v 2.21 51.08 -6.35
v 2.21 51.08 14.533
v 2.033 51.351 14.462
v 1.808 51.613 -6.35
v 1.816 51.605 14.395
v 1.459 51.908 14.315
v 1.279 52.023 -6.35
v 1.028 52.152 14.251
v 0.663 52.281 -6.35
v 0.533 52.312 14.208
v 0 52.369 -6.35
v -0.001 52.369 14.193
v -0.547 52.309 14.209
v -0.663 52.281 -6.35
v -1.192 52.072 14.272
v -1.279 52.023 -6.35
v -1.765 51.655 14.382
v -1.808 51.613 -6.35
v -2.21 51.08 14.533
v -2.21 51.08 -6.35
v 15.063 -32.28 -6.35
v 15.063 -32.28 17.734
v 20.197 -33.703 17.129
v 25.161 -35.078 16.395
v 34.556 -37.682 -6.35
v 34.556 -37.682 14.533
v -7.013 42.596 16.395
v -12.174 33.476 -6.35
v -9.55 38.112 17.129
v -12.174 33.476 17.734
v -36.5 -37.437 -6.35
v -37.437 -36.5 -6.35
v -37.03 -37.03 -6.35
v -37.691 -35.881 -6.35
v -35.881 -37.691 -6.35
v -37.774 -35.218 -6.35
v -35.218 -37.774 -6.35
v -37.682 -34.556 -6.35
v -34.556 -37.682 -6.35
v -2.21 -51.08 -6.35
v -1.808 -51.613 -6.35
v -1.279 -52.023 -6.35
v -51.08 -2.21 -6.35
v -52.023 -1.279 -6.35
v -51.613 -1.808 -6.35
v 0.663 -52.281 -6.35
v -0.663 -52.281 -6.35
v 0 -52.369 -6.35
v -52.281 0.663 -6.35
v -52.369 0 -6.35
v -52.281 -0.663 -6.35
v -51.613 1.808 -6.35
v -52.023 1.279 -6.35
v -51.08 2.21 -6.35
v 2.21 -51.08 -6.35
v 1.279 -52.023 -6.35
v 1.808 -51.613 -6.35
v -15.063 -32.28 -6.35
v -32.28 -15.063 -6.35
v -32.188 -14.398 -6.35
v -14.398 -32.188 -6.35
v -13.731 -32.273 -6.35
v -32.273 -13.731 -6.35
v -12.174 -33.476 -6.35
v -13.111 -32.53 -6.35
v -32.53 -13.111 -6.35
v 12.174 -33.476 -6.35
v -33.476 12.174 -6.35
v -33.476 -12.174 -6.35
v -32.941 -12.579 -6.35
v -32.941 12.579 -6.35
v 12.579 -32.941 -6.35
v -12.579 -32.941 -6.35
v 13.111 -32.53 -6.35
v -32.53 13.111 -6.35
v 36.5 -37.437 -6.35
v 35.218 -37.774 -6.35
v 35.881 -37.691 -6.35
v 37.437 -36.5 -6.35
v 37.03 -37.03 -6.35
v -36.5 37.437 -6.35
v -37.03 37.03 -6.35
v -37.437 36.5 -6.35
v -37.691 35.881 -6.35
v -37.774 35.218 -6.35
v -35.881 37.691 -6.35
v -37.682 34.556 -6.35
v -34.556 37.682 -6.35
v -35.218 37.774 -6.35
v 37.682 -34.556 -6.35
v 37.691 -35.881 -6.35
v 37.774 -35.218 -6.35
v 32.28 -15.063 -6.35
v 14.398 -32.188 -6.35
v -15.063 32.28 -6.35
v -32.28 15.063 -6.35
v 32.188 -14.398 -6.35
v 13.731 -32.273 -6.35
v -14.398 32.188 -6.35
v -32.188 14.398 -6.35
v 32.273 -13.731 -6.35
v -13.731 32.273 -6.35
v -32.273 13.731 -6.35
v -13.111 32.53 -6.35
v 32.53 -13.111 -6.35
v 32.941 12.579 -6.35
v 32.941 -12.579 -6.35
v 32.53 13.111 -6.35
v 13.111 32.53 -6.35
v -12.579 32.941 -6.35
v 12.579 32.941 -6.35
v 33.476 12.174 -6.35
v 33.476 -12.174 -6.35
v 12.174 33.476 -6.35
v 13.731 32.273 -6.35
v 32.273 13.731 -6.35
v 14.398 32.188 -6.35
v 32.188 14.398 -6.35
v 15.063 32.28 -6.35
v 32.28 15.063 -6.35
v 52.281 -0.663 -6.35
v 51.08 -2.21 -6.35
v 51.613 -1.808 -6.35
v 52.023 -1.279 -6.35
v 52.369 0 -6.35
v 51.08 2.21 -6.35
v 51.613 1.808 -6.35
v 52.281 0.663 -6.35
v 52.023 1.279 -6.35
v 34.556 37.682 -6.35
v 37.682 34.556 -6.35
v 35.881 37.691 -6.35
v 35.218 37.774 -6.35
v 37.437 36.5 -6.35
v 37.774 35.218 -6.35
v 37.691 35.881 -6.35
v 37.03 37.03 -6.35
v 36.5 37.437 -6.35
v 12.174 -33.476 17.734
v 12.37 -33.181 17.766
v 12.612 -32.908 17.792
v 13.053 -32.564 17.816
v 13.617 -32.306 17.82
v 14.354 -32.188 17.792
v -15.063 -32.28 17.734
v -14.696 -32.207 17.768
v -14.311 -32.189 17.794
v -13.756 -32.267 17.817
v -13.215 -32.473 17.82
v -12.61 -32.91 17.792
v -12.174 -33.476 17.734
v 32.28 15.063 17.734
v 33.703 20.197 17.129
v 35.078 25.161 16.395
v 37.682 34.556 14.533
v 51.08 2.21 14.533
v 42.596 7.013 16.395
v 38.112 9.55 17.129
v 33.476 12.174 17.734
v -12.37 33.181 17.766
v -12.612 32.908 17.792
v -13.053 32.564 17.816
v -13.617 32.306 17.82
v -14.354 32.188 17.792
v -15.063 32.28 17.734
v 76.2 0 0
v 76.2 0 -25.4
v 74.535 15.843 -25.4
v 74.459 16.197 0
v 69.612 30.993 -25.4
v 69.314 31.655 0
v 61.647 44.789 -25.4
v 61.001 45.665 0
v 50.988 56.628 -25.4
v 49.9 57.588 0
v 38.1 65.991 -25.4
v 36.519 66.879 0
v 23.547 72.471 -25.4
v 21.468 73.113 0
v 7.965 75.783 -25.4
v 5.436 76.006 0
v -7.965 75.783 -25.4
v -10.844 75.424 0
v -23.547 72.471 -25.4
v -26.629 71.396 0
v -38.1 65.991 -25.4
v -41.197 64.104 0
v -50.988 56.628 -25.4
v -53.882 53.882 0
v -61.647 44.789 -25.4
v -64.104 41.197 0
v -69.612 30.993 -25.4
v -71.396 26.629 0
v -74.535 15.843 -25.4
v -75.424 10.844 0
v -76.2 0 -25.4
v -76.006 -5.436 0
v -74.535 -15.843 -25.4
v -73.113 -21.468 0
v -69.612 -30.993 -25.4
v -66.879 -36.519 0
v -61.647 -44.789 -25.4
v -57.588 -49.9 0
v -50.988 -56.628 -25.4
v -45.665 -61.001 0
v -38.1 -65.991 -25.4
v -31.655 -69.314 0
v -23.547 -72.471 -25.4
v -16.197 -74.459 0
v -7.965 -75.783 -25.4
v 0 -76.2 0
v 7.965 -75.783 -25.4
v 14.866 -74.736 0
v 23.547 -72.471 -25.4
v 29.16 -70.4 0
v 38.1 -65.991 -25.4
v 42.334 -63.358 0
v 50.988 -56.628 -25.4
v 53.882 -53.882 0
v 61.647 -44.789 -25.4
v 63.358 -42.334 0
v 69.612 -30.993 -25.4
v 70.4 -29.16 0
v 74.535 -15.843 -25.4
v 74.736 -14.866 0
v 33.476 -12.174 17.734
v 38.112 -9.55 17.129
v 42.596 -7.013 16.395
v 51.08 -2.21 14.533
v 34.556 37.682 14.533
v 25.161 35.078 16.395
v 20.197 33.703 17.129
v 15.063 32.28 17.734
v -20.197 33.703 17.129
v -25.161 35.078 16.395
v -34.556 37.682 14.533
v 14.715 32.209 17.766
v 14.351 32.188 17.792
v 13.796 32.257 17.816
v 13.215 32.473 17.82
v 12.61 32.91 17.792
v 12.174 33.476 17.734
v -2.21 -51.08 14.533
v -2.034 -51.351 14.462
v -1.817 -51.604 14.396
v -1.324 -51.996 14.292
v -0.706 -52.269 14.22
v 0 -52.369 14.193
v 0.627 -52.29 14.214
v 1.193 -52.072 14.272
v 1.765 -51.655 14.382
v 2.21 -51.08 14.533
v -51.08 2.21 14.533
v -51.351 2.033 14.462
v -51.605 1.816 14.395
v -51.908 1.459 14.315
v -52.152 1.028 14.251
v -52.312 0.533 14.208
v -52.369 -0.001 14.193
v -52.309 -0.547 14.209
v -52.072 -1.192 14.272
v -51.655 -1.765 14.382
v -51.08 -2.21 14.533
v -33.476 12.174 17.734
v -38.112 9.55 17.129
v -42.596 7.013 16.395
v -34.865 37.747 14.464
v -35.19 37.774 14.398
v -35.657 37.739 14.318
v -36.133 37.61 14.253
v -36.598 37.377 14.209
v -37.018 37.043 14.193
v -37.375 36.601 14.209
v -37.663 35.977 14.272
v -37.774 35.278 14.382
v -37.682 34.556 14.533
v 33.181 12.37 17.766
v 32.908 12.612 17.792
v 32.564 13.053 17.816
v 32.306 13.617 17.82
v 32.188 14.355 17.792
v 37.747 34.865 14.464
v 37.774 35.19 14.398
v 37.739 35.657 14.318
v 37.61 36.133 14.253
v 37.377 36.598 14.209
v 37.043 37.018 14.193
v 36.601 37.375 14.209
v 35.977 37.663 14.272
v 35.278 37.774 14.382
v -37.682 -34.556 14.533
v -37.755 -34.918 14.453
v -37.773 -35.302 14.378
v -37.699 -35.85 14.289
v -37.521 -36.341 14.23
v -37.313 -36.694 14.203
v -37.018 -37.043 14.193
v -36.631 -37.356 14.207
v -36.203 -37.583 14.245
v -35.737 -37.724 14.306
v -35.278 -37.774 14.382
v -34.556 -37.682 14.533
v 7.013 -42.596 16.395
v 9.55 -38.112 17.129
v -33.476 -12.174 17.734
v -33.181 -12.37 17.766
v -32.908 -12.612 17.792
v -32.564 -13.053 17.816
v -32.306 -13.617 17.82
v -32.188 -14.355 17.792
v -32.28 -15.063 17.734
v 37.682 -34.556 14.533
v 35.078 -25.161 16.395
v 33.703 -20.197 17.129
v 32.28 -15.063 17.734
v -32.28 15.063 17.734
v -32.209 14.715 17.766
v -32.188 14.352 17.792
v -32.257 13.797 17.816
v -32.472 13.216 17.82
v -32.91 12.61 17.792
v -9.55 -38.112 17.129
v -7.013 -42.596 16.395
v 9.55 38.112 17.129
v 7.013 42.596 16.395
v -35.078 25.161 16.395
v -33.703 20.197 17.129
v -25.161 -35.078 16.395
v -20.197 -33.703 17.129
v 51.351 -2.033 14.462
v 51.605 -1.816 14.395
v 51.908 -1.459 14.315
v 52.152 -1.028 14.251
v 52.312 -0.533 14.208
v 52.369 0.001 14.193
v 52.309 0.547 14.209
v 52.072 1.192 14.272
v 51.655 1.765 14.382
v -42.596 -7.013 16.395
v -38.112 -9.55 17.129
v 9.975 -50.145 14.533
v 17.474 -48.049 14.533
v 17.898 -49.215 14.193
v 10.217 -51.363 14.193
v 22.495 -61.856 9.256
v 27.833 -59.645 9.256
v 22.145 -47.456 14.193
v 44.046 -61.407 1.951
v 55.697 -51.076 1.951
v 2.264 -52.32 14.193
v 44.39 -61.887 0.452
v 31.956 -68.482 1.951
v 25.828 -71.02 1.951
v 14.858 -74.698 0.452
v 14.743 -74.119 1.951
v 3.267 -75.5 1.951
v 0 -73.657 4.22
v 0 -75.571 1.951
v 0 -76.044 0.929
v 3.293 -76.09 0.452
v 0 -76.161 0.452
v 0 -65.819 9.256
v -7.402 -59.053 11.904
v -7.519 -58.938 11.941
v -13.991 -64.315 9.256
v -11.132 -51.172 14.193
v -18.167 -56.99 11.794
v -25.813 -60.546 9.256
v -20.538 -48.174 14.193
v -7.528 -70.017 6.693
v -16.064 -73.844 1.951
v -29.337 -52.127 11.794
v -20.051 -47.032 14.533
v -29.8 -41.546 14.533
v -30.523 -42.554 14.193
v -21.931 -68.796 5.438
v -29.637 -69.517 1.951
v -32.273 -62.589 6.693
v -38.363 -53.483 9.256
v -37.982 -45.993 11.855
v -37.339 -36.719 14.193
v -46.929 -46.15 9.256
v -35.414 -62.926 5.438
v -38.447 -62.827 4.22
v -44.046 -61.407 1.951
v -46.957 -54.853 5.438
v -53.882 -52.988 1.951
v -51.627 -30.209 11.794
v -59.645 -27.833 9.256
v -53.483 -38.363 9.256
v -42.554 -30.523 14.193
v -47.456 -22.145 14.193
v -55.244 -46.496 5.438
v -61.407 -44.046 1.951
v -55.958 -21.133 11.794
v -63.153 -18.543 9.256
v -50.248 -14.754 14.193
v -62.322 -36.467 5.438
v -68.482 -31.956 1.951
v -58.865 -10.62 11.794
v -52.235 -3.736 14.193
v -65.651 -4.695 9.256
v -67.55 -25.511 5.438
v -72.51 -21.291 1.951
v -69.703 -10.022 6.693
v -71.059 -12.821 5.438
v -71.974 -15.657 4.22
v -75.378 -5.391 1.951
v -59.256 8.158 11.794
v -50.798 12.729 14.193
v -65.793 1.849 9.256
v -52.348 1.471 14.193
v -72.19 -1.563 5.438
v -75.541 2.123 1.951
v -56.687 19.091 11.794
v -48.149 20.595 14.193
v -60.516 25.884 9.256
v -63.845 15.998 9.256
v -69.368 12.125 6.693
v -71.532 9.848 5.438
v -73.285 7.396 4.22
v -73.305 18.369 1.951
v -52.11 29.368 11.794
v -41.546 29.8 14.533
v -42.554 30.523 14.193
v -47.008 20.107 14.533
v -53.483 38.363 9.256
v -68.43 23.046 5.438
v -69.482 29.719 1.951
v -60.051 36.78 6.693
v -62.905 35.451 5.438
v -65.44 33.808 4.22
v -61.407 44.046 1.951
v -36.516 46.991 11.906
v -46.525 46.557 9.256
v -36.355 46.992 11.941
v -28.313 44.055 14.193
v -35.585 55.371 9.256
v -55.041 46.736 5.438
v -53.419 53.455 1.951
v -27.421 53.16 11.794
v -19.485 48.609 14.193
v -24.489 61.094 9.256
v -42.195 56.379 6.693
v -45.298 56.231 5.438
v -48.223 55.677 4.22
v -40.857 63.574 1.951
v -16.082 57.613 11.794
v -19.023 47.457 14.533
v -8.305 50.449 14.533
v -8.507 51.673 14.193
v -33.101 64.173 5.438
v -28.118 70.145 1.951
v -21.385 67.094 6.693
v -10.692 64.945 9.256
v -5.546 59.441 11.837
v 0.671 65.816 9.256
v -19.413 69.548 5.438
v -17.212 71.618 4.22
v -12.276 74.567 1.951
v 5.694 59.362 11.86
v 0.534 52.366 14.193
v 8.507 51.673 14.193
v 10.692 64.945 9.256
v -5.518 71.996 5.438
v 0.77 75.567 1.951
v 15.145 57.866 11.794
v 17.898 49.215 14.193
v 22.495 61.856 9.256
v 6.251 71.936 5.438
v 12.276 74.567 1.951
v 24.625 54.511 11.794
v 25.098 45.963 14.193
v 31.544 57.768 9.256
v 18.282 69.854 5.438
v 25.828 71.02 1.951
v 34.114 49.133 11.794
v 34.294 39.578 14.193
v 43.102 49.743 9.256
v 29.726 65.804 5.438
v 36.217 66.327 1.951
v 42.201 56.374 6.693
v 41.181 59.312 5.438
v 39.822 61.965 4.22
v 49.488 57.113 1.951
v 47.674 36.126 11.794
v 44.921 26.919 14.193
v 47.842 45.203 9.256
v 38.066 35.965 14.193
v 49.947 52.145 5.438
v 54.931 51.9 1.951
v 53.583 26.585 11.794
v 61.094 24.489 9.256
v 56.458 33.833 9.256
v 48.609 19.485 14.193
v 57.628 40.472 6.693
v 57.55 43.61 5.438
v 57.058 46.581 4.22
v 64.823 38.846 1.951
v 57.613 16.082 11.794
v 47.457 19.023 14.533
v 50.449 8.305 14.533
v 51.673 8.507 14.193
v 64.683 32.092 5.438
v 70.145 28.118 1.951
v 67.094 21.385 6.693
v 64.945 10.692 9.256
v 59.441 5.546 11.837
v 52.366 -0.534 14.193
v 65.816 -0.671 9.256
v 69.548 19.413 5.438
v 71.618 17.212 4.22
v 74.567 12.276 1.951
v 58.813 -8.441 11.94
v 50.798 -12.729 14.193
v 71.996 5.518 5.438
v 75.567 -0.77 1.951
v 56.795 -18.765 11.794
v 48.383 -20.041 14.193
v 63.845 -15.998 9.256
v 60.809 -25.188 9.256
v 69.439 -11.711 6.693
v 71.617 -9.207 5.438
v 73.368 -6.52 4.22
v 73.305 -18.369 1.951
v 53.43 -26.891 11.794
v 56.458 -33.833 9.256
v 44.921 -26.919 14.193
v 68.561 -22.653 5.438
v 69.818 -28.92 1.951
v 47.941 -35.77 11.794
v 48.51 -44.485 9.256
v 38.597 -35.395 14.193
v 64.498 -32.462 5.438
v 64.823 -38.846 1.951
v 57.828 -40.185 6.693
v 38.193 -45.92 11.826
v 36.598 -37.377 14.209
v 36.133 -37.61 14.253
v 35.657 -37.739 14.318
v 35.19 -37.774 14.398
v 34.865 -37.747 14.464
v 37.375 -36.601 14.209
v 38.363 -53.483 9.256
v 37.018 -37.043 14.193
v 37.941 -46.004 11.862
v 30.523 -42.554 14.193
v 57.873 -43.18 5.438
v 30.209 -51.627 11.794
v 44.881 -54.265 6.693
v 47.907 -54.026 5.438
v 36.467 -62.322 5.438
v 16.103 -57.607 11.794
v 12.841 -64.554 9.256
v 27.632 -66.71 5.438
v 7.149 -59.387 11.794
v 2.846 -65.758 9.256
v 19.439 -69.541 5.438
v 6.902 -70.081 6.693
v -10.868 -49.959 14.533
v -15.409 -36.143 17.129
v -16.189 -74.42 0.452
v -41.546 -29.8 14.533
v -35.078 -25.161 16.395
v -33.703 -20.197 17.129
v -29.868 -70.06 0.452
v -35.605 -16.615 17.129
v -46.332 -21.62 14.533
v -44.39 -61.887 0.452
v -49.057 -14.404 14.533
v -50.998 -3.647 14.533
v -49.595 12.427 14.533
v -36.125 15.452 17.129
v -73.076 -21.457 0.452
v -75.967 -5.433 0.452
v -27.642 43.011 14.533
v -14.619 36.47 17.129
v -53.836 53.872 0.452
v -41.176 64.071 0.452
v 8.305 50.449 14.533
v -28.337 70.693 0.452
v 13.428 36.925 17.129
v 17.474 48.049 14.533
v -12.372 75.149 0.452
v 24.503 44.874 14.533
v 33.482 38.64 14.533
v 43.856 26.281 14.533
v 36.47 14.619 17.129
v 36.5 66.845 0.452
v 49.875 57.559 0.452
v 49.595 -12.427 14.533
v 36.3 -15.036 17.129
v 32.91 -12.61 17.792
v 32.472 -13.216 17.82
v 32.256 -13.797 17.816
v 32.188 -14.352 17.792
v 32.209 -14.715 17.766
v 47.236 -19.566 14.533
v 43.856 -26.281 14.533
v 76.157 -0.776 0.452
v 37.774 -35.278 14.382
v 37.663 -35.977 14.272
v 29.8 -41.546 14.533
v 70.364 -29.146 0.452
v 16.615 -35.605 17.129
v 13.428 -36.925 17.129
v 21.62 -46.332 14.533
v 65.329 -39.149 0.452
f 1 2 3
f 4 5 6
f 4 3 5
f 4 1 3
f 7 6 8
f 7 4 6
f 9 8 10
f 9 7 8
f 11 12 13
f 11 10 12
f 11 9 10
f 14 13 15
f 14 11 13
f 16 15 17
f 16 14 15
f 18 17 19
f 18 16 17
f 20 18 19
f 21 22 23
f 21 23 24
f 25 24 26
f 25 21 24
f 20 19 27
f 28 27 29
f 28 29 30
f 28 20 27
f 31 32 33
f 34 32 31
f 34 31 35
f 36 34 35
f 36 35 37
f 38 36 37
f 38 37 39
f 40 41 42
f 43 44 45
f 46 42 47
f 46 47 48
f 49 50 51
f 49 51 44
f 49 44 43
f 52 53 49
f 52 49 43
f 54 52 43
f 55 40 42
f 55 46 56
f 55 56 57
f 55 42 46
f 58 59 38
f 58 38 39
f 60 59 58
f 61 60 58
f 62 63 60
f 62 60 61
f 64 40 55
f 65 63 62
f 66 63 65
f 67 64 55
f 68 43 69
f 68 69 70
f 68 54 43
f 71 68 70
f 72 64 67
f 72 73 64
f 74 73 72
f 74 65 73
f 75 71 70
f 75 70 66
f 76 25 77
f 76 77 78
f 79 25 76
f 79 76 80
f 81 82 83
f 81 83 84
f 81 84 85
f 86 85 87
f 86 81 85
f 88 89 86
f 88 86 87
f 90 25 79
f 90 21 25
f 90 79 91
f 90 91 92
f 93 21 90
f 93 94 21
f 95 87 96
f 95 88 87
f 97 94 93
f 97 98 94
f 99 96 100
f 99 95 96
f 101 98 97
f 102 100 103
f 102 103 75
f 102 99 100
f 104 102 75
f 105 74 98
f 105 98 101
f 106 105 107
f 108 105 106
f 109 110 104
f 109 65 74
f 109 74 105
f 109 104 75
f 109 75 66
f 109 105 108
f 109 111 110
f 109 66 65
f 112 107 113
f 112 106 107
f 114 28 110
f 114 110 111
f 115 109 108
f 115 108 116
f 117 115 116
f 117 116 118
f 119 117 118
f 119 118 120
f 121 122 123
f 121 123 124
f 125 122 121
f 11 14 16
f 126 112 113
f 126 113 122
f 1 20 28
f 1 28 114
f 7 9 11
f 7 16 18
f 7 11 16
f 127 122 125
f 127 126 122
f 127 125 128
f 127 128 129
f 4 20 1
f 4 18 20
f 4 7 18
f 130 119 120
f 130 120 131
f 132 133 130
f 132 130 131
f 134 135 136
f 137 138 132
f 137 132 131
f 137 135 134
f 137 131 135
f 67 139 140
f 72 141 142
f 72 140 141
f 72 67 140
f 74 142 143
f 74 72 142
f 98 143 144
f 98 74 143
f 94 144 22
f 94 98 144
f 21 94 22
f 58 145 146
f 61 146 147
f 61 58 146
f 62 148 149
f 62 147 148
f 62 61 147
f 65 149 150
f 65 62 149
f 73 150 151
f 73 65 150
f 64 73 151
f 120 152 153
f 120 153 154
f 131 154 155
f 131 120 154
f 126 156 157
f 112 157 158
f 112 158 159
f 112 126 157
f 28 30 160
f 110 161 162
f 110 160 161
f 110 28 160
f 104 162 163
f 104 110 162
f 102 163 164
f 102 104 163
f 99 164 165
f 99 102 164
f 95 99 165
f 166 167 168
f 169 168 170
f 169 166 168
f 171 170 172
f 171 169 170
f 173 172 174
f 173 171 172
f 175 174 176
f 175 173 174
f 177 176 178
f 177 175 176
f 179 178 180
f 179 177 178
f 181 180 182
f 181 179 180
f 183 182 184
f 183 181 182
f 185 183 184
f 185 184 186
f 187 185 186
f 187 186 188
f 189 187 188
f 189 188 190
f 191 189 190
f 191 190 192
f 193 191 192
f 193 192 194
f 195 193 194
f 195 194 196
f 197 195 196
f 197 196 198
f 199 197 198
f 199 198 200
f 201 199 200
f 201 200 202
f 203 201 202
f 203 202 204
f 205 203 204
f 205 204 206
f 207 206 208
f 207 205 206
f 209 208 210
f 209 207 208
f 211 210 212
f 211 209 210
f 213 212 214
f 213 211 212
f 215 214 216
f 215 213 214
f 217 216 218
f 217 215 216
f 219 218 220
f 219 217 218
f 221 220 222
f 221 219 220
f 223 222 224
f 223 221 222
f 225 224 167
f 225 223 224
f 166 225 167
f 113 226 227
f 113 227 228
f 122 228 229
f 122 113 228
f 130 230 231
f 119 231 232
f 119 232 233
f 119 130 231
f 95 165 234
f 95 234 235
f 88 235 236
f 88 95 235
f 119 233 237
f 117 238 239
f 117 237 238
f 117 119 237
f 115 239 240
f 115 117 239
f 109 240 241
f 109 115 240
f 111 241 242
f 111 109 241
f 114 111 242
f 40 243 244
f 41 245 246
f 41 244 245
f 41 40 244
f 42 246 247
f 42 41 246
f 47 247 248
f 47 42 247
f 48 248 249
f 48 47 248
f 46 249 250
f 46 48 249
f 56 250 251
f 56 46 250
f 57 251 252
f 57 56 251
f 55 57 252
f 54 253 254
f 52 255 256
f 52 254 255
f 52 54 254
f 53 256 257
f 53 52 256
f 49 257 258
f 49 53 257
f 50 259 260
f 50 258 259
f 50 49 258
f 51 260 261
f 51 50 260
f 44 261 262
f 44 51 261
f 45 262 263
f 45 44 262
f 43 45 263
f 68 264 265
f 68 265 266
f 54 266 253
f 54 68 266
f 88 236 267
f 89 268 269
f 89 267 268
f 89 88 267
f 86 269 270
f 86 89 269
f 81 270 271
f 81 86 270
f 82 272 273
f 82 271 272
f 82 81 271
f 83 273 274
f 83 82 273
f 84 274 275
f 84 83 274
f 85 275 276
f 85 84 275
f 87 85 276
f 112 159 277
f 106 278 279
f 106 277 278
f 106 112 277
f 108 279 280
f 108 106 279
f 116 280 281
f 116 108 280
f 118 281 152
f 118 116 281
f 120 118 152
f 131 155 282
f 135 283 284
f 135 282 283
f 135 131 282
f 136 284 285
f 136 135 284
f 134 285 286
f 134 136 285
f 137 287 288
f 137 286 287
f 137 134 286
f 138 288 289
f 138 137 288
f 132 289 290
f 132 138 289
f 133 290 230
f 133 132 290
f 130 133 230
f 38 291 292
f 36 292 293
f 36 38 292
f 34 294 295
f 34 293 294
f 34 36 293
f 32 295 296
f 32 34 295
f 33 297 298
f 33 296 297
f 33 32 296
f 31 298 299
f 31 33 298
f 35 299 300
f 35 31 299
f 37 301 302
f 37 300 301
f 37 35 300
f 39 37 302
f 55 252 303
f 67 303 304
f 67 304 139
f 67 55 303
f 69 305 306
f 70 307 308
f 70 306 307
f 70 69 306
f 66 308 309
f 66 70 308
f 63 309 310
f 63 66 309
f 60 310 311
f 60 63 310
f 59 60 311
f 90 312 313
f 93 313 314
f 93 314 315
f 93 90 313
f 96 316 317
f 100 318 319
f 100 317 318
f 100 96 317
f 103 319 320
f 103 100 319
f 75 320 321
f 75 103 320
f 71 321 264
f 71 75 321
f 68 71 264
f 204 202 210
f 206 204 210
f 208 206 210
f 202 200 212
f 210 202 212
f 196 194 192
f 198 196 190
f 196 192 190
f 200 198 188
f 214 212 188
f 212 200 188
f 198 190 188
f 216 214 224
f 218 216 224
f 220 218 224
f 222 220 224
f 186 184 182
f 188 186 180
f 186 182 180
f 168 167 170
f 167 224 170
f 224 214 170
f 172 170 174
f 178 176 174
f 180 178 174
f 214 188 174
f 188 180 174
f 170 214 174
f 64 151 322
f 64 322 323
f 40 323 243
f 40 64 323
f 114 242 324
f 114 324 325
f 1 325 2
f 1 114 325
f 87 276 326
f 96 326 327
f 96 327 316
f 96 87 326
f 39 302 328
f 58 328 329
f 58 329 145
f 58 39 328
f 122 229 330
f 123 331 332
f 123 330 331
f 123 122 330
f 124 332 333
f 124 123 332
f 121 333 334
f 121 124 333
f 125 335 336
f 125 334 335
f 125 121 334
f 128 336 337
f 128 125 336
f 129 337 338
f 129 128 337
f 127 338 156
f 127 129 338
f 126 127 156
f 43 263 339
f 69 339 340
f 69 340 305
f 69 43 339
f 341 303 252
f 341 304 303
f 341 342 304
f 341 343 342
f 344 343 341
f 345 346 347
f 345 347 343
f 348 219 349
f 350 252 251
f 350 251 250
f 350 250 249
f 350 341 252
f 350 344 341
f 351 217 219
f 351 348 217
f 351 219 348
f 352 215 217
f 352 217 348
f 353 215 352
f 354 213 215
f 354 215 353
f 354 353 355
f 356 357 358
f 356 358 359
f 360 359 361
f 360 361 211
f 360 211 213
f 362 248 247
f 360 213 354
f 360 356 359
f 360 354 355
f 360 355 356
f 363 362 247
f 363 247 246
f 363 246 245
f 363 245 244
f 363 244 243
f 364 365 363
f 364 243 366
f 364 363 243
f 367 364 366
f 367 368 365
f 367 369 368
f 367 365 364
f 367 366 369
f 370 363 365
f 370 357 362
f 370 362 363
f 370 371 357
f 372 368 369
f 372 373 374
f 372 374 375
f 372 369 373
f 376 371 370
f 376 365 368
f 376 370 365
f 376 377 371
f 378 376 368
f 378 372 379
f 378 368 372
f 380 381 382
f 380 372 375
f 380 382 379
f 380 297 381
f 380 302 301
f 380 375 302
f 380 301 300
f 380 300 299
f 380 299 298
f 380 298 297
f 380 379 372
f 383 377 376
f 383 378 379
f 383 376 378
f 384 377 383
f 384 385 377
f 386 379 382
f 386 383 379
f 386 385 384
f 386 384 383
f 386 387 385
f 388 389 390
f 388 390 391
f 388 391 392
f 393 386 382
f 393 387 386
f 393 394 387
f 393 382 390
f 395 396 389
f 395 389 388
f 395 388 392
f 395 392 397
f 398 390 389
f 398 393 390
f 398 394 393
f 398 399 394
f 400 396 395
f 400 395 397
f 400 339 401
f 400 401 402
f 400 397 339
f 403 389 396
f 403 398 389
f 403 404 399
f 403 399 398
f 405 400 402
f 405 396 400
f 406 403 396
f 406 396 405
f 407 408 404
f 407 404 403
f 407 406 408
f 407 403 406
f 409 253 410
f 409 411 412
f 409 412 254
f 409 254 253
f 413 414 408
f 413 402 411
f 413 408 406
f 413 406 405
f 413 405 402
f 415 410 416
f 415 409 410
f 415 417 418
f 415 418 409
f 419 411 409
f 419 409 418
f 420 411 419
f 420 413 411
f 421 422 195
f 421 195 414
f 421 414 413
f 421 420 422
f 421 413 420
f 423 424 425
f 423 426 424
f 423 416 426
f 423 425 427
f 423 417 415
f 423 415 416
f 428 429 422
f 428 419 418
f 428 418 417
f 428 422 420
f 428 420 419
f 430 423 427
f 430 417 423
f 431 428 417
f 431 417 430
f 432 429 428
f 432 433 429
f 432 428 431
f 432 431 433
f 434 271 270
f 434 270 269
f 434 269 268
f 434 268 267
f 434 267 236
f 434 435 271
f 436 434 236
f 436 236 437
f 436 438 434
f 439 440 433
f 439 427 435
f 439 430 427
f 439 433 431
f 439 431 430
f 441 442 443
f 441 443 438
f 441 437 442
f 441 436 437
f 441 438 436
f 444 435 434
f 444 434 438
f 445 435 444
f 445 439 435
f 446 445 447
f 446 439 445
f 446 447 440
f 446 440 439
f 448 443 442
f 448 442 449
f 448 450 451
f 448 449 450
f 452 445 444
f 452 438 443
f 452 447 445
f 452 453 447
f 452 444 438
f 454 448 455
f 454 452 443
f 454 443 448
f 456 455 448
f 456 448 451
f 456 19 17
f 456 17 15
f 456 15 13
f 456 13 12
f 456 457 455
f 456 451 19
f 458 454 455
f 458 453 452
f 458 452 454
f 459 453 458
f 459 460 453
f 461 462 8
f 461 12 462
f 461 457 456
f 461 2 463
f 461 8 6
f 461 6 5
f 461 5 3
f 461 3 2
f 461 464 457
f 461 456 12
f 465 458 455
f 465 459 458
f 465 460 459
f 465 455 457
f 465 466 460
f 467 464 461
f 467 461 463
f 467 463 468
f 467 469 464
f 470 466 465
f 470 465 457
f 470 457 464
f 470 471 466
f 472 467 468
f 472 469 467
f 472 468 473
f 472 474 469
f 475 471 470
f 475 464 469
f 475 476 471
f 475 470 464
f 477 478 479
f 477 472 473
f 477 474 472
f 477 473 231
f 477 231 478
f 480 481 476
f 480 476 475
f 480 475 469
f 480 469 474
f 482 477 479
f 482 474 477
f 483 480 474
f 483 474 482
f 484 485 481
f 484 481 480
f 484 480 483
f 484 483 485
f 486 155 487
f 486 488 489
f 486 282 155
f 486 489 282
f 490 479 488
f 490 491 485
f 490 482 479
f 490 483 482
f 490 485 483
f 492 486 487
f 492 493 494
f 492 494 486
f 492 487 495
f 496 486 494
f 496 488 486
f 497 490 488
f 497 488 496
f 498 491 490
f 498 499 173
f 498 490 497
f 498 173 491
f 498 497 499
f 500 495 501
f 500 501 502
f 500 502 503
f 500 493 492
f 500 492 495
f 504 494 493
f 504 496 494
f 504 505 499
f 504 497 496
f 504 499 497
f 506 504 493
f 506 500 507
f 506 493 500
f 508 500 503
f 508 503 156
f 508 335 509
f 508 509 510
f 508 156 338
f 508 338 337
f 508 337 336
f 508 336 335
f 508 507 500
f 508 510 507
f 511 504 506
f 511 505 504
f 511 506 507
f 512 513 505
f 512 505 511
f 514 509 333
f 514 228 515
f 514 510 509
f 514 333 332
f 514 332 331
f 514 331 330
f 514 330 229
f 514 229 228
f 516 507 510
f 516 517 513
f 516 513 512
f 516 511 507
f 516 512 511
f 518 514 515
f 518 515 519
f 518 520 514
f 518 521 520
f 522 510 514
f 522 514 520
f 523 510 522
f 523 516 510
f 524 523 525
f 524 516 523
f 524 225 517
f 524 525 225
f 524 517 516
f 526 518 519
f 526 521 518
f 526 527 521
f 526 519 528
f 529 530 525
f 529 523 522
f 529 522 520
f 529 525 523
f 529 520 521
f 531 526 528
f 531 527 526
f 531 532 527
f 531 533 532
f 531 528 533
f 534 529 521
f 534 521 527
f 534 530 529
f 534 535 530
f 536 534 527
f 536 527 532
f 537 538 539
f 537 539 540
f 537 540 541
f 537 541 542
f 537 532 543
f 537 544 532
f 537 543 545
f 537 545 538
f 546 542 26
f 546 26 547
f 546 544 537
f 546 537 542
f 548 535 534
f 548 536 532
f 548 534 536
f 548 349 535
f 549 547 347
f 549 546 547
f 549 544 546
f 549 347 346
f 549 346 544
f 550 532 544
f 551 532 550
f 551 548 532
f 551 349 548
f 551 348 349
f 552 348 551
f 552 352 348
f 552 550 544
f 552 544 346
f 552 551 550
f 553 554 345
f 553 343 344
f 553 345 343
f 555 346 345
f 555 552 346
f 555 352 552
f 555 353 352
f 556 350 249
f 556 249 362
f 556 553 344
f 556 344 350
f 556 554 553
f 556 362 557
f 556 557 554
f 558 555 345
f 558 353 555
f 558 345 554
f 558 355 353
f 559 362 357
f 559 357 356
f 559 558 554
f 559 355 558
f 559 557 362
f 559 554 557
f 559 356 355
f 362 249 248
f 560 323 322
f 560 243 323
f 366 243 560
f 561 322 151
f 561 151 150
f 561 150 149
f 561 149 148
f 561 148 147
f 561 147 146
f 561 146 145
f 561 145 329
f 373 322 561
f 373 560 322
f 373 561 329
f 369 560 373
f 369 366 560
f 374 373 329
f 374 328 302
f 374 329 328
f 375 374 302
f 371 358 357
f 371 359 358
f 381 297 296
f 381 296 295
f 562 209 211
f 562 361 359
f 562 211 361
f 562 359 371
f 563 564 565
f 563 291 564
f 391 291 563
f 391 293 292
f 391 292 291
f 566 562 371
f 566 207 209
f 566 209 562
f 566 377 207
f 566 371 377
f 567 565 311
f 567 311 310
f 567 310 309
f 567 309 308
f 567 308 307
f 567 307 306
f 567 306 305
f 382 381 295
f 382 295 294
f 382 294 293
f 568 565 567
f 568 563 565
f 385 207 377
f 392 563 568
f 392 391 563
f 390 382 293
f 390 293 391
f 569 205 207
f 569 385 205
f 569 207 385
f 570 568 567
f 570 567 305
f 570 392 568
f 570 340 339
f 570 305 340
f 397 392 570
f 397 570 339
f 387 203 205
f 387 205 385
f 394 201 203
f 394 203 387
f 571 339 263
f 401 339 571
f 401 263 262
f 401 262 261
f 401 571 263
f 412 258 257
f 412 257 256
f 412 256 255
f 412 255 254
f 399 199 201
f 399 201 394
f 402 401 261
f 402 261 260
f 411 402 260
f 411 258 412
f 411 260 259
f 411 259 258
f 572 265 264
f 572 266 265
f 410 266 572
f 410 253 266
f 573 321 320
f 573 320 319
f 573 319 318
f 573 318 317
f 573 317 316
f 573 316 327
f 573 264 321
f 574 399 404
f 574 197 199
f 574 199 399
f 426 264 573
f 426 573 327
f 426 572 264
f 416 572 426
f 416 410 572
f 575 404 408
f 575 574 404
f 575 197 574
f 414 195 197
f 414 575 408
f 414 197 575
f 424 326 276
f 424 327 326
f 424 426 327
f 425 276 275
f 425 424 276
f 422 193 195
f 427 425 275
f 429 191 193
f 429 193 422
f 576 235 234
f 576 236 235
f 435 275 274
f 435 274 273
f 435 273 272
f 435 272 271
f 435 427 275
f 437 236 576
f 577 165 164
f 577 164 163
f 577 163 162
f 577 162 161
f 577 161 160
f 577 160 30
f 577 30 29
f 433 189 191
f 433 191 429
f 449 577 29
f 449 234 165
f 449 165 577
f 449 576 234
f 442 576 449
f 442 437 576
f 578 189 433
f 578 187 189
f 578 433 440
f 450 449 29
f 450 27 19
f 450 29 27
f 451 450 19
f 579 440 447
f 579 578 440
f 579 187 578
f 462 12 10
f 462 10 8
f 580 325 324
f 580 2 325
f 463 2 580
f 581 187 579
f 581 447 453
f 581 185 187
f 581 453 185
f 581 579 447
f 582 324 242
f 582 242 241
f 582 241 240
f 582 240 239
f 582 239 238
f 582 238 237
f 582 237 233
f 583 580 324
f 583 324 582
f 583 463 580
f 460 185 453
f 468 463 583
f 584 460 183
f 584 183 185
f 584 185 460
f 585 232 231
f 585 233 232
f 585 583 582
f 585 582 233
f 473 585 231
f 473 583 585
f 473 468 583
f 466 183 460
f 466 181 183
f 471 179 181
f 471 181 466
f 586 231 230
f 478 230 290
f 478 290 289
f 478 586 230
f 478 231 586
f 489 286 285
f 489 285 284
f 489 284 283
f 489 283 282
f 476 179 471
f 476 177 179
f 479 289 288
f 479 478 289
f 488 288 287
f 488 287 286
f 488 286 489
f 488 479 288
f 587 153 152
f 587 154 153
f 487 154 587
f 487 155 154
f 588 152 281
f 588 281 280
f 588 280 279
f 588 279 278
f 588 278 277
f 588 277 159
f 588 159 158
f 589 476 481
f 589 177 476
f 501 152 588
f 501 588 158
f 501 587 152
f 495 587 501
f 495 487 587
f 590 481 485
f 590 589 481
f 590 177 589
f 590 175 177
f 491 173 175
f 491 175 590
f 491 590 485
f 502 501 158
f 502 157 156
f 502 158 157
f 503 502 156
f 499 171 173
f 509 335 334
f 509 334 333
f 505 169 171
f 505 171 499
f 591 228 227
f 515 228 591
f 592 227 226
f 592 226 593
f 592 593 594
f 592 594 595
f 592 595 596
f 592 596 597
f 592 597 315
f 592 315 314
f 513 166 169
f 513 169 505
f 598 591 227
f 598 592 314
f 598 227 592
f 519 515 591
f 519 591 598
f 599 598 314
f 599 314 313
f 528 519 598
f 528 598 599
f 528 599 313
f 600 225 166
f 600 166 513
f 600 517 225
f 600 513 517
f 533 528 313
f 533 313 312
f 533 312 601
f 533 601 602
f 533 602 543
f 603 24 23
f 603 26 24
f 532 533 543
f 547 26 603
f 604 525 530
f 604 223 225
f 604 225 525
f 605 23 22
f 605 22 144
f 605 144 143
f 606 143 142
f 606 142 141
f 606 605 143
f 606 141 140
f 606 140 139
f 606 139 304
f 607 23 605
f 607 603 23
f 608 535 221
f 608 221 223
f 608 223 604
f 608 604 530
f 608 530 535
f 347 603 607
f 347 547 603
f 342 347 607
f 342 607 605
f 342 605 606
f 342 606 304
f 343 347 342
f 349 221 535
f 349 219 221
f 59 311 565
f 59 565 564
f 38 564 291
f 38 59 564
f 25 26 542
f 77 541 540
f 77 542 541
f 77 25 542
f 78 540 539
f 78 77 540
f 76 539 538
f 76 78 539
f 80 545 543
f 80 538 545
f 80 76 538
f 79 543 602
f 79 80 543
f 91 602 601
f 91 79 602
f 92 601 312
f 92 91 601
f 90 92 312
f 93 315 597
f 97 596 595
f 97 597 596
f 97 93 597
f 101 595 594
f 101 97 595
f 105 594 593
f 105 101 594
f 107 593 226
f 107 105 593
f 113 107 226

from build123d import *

# Parameters (mm, degrees)
F0_R          = 76.2
F1_DEPTH      = 25.4
F4_DEPTH      = 20.21225
F4_DEPTH_BACK = 6.35


with BuildPart() as f1:
    # F0 (on Top) → F1 (new body)
    with BuildSketch(Plane.XY):
        Circle(F0_R)
        with BuildLine():
            ThreePointArc((-15.062988, 32.279811), (-13.412606, 32.380894), (-12.174132, 33.476414))
            Line((-12.174132, 33.476414), (-2.210489, 51.080058))
            ThreePointArc((-2.210489, 51.080058), (0, 52.368924), (2.210489, 51.080058))
            Line((2.210489, 51.080058), (12.174132, 33.476414))
            ThreePointArc((12.174132, 33.476414), (13.412606, 32.380894), (15.062988, 32.279811))
            Line((15.062988, 32.279811), (34.556004, 37.682107))
            ThreePointArc((34.556004, 37.682107), (37.030421, 37.030421), (37.682107, 34.556004))
            Line((37.682107, 34.556004), (32.279811, 15.062988))
            ThreePointArc((32.279811, 15.062988), (32.380894, 13.412606), (33.476414, 12.174132))
            Line((33.476414, 12.174132), (51.080058, 2.210489))
            ThreePointArc((51.080058, 2.210489), (52.368924, 0), (51.080058, -2.210489))
            Line((51.080058, -2.210489), (33.476414, -12.174132))
            ThreePointArc((33.476414, -12.174132), (32.380894, -13.412606), (32.279811, -15.062988))
            Line((32.279811, -15.062988), (37.682107, -34.556004))
            ThreePointArc((37.682107, -34.556004), (37.030421, -37.030421), (34.556004, -37.682107))
            Line((34.556004, -37.682107), (15.062988, -32.279811))
            ThreePointArc((15.062988, -32.279811), (13.412606, -32.380894), (12.174132, -33.476414))
            Line((12.174132, -33.476414), (2.210489, -51.080058))
            ThreePointArc((2.210489, -51.080058), (0, -52.368924), (-2.210489, -51.080058))
            Line((-2.210489, -51.080058), (-12.174132, -33.476414))
            ThreePointArc((-12.174132, -33.476414), (-13.412606, -32.380894), (-15.062988, -32.279811))
            Line((-15.062988, -32.279811), (-34.556004, -37.682107))
            ThreePointArc((-34.556004, -37.682107), (-37.030421, -37.030421), (-37.682107, -34.556004))
            Line((-37.682107, -34.556004), (-32.279811, -15.062988))
            ThreePointArc((-32.279811, -15.062988), (-32.380894, -13.412606), (-33.476414, -12.174132))
            Line((-33.476414, -12.174132), (-51.080058, -2.210489))
            ThreePointArc((-51.080058, -2.210489), (-52.368924, 0), (-51.080058, 2.210489))
            Line((-51.080058, 2.210489), (-33.476414, 12.174132))
            ThreePointArc((-33.476414, 12.174132), (-32.380894, 13.412606), (-32.279811, 15.062988))
            Line((-32.279811, 15.062988), (-37.682107, 34.556004))
            ThreePointArc((-37.682107, 34.556004), (-37.030421, 37.030421), (-34.556004, 37.682107))
            Line((-34.556004, 37.682107), (-15.062988, 32.279811))
        make_face(mode=Mode.SUBTRACT)
        with BuildLine():
            Line((-2.210489, 51.080058), (-12.174132, 33.476414))
            ThreePointArc((-12.174132, 33.476414), (-13.412606, 32.380894), (-15.062988, 32.279811))
            Line((-15.062988, 32.279811), (-34.556004, 37.682107))
            ThreePointArc((-34.556004, 37.682107), (-37.030421, 37.030421), (-37.682107, 34.556004))
            Line((-37.682107, 34.556004), (-32.279811, 15.062988))
            ThreePointArc((-32.279811, 15.062988), (-32.380894, 13.412606), (-33.476414, 12.174132))
            Line((-33.476414, 12.174132), (-51.080058, 2.210489))
            ThreePointArc((-51.080058, 2.210489), (-52.368924, 0), (-51.080058, -2.210489))
            Line((-51.080058, -2.210489), (-33.476414, -12.174132))
            ThreePointArc((-33.476414, -12.174132), (-32.380894, -13.412606), (-32.279811, -15.062988))
            Line((-32.279811, -15.062988), (-37.682107, -34.556004))
            ThreePointArc((-37.682107, -34.556004), (-37.030421, -37.030421), (-34.556004, -37.682107))
            Line((-34.556004, -37.682107), (-15.062988, -32.279811))
            ThreePointArc((-15.062988, -32.279811), (-13.412606, -32.380894), (-12.174132, -33.476414))
            Line((-12.174132, -33.476414), (-2.210489, -51.080058))
            ThreePointArc((-2.210489, -51.080058), (0, -52.368924), (2.210489, -51.080058))
            Line((2.210489, -51.080058), (12.174132, -33.476414))
            ThreePointArc((12.174132, -33.476414), (13.412606, -32.380894), (15.062988, -32.279811))
            Line((15.062988, -32.279811), (34.556004, -37.682107))
            ThreePointArc((34.556004, -37.682107), (37.030421, -37.030421), (37.682107, -34.556004))
            Line((37.682107, -34.556004), (32.279811, -15.062988))
            ThreePointArc((32.279811, -15.062988), (32.380894, -13.412606), (33.476414, -12.174132))
            Line((33.476414, -12.174132), (51.080058, -2.210489))
            ThreePointArc((51.080058, -2.210489), (52.368924, 0), (51.080058, 2.210489))
            Line((51.080058, 2.210489), (33.476414, 12.174132))
            ThreePointArc((33.476414, 12.174132), (32.380894, 13.412606), (32.279811, 15.062988))
            Line((32.279811, 15.062988), (37.682107, 34.556004))
            ThreePointArc((37.682107, 34.556004), (37.030421, 37.030421), (34.556004, 37.682107))
            Line((34.556004, 37.682107), (15.062988, 32.279811))
            ThreePointArc((15.062988, 32.279811), (13.412606, 32.380894), (12.174132, 33.476414))
            Line((12.174132, 33.476414), (2.210489, 51.080058))
            ThreePointArc((2.210489, 51.080058), (0, 52.368924), (-2.210489, 51.080058))
        make_face()
    extrude(amount=-F1_DEPTH)

    # F2 (on Right) → F3 (revolve)
    with BuildSketch(Plane.YZ):
        with BuildLine():
            add(Edge.make_bspline(
                [(0, 20.21125), (-53.338584, 20.21125), (-76.2, 6.136773), (-76.2, 0)],
                knots=[0, 0, 0, 0, 78.834857, 78.834857, 78.834857, 78.834857], degree=3))
            Line((-76.2, 0), (0, 0))
            Line((0, 0), (0, 20.21125))
        make_face()
    revolve(axis=Axis((0, 0, 10.105625), (0, 0, -1)))

    # F0 (on Top) → F4 (cut, two sides)
    with BuildSketch(Plane.XY) as f4_sk:
        with BuildLine():
            Line((-2.210489, 51.080058), (-12.174132, 33.476414))
            ThreePointArc((-12.174132, 33.476414), (-13.412606, 32.380894), (-15.062988, 32.279811))
            Line((-15.062988, 32.279811), (-34.556004, 37.682107))
            ThreePointArc((-34.556004, 37.682107), (-37.030421, 37.030421), (-37.682107, 34.556004))
            Line((-37.682107, 34.556004), (-32.279811, 15.062988))
            ThreePointArc((-32.279811, 15.062988), (-32.380894, 13.412606), (-33.476414, 12.174132))
            Line((-33.476414, 12.174132), (-51.080058, 2.210489))
            ThreePointArc((-51.080058, 2.210489), (-52.368924, 0), (-51.080058, -2.210489))
            Line((-51.080058, -2.210489), (-33.476414, -12.174132))
            ThreePointArc((-33.476414, -12.174132), (-32.380894, -13.412606), (-32.279811, -15.062988))
            Line((-32.279811, -15.062988), (-37.682107, -34.556004))
            ThreePointArc((-37.682107, -34.556004), (-37.030421, -37.030421), (-34.556004, -37.682107))
            Line((-34.556004, -37.682107), (-15.062988, -32.279811))
            ThreePointArc((-15.062988, -32.279811), (-13.412606, -32.380894), (-12.174132, -33.476414))
            Line((-12.174132, -33.476414), (-2.210489, -51.080058))
            ThreePointArc((-2.210489, -51.080058), (0, -52.368924), (2.210489, -51.080058))
            Line((2.210489, -51.080058), (12.174132, -33.476414))
            ThreePointArc((12.174132, -33.476414), (13.412606, -32.380894), (15.062988, -32.279811))
            Line((15.062988, -32.279811), (34.556004, -37.682107))
            ThreePointArc((34.556004, -37.682107), (37.030421, -37.030421), (37.682107, -34.556004))
            Line((37.682107, -34.556004), (32.279811, -15.062988))
            ThreePointArc((32.279811, -15.062988), (32.380894, -13.412606), (33.476414, -12.174132))
            Line((33.476414, -12.174132), (51.080058, -2.210489))
            ThreePointArc((51.080058, -2.210489), (52.368924, 0), (51.080058, 2.210489))
            Line((51.080058, 2.210489), (33.476414, 12.174132))
            ThreePointArc((33.476414, 12.174132), (32.380894, 13.412606), (32.279811, 15.062988))
            Line((32.279811, 15.062988), (37.682107, 34.556004))
            ThreePointArc((37.682107, 34.556004), (37.030421, 37.030421), (34.556004, 37.682107))
            Line((34.556004, 37.682107), (15.062988, 32.279811))
            ThreePointArc((15.062988, 32.279811), (13.412606, 32.380894), (12.174132, 33.476414))
            Line((12.174132, 33.476414), (2.210489, 51.080058))
            ThreePointArc((2.210489, 51.080058), (0, 52.368924), (-2.210489, 51.080058))
        make_face()
    extrude(amount=F4_DEPTH, mode=Mode.SUBTRACT)
    extrude(f4_sk.sketch, amount=-F4_DEPTH_BACK, mode=Mode.SUBTRACT)


solid = f1.part
